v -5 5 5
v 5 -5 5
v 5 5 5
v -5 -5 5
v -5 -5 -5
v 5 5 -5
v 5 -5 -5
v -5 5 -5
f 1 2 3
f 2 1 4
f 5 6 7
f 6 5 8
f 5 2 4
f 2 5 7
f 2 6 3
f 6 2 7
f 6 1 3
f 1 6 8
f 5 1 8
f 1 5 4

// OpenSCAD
$fs=0.25;$fa=6;
color([0.7686,0.1176,0.2275])cube([10,10,10],center=true);
